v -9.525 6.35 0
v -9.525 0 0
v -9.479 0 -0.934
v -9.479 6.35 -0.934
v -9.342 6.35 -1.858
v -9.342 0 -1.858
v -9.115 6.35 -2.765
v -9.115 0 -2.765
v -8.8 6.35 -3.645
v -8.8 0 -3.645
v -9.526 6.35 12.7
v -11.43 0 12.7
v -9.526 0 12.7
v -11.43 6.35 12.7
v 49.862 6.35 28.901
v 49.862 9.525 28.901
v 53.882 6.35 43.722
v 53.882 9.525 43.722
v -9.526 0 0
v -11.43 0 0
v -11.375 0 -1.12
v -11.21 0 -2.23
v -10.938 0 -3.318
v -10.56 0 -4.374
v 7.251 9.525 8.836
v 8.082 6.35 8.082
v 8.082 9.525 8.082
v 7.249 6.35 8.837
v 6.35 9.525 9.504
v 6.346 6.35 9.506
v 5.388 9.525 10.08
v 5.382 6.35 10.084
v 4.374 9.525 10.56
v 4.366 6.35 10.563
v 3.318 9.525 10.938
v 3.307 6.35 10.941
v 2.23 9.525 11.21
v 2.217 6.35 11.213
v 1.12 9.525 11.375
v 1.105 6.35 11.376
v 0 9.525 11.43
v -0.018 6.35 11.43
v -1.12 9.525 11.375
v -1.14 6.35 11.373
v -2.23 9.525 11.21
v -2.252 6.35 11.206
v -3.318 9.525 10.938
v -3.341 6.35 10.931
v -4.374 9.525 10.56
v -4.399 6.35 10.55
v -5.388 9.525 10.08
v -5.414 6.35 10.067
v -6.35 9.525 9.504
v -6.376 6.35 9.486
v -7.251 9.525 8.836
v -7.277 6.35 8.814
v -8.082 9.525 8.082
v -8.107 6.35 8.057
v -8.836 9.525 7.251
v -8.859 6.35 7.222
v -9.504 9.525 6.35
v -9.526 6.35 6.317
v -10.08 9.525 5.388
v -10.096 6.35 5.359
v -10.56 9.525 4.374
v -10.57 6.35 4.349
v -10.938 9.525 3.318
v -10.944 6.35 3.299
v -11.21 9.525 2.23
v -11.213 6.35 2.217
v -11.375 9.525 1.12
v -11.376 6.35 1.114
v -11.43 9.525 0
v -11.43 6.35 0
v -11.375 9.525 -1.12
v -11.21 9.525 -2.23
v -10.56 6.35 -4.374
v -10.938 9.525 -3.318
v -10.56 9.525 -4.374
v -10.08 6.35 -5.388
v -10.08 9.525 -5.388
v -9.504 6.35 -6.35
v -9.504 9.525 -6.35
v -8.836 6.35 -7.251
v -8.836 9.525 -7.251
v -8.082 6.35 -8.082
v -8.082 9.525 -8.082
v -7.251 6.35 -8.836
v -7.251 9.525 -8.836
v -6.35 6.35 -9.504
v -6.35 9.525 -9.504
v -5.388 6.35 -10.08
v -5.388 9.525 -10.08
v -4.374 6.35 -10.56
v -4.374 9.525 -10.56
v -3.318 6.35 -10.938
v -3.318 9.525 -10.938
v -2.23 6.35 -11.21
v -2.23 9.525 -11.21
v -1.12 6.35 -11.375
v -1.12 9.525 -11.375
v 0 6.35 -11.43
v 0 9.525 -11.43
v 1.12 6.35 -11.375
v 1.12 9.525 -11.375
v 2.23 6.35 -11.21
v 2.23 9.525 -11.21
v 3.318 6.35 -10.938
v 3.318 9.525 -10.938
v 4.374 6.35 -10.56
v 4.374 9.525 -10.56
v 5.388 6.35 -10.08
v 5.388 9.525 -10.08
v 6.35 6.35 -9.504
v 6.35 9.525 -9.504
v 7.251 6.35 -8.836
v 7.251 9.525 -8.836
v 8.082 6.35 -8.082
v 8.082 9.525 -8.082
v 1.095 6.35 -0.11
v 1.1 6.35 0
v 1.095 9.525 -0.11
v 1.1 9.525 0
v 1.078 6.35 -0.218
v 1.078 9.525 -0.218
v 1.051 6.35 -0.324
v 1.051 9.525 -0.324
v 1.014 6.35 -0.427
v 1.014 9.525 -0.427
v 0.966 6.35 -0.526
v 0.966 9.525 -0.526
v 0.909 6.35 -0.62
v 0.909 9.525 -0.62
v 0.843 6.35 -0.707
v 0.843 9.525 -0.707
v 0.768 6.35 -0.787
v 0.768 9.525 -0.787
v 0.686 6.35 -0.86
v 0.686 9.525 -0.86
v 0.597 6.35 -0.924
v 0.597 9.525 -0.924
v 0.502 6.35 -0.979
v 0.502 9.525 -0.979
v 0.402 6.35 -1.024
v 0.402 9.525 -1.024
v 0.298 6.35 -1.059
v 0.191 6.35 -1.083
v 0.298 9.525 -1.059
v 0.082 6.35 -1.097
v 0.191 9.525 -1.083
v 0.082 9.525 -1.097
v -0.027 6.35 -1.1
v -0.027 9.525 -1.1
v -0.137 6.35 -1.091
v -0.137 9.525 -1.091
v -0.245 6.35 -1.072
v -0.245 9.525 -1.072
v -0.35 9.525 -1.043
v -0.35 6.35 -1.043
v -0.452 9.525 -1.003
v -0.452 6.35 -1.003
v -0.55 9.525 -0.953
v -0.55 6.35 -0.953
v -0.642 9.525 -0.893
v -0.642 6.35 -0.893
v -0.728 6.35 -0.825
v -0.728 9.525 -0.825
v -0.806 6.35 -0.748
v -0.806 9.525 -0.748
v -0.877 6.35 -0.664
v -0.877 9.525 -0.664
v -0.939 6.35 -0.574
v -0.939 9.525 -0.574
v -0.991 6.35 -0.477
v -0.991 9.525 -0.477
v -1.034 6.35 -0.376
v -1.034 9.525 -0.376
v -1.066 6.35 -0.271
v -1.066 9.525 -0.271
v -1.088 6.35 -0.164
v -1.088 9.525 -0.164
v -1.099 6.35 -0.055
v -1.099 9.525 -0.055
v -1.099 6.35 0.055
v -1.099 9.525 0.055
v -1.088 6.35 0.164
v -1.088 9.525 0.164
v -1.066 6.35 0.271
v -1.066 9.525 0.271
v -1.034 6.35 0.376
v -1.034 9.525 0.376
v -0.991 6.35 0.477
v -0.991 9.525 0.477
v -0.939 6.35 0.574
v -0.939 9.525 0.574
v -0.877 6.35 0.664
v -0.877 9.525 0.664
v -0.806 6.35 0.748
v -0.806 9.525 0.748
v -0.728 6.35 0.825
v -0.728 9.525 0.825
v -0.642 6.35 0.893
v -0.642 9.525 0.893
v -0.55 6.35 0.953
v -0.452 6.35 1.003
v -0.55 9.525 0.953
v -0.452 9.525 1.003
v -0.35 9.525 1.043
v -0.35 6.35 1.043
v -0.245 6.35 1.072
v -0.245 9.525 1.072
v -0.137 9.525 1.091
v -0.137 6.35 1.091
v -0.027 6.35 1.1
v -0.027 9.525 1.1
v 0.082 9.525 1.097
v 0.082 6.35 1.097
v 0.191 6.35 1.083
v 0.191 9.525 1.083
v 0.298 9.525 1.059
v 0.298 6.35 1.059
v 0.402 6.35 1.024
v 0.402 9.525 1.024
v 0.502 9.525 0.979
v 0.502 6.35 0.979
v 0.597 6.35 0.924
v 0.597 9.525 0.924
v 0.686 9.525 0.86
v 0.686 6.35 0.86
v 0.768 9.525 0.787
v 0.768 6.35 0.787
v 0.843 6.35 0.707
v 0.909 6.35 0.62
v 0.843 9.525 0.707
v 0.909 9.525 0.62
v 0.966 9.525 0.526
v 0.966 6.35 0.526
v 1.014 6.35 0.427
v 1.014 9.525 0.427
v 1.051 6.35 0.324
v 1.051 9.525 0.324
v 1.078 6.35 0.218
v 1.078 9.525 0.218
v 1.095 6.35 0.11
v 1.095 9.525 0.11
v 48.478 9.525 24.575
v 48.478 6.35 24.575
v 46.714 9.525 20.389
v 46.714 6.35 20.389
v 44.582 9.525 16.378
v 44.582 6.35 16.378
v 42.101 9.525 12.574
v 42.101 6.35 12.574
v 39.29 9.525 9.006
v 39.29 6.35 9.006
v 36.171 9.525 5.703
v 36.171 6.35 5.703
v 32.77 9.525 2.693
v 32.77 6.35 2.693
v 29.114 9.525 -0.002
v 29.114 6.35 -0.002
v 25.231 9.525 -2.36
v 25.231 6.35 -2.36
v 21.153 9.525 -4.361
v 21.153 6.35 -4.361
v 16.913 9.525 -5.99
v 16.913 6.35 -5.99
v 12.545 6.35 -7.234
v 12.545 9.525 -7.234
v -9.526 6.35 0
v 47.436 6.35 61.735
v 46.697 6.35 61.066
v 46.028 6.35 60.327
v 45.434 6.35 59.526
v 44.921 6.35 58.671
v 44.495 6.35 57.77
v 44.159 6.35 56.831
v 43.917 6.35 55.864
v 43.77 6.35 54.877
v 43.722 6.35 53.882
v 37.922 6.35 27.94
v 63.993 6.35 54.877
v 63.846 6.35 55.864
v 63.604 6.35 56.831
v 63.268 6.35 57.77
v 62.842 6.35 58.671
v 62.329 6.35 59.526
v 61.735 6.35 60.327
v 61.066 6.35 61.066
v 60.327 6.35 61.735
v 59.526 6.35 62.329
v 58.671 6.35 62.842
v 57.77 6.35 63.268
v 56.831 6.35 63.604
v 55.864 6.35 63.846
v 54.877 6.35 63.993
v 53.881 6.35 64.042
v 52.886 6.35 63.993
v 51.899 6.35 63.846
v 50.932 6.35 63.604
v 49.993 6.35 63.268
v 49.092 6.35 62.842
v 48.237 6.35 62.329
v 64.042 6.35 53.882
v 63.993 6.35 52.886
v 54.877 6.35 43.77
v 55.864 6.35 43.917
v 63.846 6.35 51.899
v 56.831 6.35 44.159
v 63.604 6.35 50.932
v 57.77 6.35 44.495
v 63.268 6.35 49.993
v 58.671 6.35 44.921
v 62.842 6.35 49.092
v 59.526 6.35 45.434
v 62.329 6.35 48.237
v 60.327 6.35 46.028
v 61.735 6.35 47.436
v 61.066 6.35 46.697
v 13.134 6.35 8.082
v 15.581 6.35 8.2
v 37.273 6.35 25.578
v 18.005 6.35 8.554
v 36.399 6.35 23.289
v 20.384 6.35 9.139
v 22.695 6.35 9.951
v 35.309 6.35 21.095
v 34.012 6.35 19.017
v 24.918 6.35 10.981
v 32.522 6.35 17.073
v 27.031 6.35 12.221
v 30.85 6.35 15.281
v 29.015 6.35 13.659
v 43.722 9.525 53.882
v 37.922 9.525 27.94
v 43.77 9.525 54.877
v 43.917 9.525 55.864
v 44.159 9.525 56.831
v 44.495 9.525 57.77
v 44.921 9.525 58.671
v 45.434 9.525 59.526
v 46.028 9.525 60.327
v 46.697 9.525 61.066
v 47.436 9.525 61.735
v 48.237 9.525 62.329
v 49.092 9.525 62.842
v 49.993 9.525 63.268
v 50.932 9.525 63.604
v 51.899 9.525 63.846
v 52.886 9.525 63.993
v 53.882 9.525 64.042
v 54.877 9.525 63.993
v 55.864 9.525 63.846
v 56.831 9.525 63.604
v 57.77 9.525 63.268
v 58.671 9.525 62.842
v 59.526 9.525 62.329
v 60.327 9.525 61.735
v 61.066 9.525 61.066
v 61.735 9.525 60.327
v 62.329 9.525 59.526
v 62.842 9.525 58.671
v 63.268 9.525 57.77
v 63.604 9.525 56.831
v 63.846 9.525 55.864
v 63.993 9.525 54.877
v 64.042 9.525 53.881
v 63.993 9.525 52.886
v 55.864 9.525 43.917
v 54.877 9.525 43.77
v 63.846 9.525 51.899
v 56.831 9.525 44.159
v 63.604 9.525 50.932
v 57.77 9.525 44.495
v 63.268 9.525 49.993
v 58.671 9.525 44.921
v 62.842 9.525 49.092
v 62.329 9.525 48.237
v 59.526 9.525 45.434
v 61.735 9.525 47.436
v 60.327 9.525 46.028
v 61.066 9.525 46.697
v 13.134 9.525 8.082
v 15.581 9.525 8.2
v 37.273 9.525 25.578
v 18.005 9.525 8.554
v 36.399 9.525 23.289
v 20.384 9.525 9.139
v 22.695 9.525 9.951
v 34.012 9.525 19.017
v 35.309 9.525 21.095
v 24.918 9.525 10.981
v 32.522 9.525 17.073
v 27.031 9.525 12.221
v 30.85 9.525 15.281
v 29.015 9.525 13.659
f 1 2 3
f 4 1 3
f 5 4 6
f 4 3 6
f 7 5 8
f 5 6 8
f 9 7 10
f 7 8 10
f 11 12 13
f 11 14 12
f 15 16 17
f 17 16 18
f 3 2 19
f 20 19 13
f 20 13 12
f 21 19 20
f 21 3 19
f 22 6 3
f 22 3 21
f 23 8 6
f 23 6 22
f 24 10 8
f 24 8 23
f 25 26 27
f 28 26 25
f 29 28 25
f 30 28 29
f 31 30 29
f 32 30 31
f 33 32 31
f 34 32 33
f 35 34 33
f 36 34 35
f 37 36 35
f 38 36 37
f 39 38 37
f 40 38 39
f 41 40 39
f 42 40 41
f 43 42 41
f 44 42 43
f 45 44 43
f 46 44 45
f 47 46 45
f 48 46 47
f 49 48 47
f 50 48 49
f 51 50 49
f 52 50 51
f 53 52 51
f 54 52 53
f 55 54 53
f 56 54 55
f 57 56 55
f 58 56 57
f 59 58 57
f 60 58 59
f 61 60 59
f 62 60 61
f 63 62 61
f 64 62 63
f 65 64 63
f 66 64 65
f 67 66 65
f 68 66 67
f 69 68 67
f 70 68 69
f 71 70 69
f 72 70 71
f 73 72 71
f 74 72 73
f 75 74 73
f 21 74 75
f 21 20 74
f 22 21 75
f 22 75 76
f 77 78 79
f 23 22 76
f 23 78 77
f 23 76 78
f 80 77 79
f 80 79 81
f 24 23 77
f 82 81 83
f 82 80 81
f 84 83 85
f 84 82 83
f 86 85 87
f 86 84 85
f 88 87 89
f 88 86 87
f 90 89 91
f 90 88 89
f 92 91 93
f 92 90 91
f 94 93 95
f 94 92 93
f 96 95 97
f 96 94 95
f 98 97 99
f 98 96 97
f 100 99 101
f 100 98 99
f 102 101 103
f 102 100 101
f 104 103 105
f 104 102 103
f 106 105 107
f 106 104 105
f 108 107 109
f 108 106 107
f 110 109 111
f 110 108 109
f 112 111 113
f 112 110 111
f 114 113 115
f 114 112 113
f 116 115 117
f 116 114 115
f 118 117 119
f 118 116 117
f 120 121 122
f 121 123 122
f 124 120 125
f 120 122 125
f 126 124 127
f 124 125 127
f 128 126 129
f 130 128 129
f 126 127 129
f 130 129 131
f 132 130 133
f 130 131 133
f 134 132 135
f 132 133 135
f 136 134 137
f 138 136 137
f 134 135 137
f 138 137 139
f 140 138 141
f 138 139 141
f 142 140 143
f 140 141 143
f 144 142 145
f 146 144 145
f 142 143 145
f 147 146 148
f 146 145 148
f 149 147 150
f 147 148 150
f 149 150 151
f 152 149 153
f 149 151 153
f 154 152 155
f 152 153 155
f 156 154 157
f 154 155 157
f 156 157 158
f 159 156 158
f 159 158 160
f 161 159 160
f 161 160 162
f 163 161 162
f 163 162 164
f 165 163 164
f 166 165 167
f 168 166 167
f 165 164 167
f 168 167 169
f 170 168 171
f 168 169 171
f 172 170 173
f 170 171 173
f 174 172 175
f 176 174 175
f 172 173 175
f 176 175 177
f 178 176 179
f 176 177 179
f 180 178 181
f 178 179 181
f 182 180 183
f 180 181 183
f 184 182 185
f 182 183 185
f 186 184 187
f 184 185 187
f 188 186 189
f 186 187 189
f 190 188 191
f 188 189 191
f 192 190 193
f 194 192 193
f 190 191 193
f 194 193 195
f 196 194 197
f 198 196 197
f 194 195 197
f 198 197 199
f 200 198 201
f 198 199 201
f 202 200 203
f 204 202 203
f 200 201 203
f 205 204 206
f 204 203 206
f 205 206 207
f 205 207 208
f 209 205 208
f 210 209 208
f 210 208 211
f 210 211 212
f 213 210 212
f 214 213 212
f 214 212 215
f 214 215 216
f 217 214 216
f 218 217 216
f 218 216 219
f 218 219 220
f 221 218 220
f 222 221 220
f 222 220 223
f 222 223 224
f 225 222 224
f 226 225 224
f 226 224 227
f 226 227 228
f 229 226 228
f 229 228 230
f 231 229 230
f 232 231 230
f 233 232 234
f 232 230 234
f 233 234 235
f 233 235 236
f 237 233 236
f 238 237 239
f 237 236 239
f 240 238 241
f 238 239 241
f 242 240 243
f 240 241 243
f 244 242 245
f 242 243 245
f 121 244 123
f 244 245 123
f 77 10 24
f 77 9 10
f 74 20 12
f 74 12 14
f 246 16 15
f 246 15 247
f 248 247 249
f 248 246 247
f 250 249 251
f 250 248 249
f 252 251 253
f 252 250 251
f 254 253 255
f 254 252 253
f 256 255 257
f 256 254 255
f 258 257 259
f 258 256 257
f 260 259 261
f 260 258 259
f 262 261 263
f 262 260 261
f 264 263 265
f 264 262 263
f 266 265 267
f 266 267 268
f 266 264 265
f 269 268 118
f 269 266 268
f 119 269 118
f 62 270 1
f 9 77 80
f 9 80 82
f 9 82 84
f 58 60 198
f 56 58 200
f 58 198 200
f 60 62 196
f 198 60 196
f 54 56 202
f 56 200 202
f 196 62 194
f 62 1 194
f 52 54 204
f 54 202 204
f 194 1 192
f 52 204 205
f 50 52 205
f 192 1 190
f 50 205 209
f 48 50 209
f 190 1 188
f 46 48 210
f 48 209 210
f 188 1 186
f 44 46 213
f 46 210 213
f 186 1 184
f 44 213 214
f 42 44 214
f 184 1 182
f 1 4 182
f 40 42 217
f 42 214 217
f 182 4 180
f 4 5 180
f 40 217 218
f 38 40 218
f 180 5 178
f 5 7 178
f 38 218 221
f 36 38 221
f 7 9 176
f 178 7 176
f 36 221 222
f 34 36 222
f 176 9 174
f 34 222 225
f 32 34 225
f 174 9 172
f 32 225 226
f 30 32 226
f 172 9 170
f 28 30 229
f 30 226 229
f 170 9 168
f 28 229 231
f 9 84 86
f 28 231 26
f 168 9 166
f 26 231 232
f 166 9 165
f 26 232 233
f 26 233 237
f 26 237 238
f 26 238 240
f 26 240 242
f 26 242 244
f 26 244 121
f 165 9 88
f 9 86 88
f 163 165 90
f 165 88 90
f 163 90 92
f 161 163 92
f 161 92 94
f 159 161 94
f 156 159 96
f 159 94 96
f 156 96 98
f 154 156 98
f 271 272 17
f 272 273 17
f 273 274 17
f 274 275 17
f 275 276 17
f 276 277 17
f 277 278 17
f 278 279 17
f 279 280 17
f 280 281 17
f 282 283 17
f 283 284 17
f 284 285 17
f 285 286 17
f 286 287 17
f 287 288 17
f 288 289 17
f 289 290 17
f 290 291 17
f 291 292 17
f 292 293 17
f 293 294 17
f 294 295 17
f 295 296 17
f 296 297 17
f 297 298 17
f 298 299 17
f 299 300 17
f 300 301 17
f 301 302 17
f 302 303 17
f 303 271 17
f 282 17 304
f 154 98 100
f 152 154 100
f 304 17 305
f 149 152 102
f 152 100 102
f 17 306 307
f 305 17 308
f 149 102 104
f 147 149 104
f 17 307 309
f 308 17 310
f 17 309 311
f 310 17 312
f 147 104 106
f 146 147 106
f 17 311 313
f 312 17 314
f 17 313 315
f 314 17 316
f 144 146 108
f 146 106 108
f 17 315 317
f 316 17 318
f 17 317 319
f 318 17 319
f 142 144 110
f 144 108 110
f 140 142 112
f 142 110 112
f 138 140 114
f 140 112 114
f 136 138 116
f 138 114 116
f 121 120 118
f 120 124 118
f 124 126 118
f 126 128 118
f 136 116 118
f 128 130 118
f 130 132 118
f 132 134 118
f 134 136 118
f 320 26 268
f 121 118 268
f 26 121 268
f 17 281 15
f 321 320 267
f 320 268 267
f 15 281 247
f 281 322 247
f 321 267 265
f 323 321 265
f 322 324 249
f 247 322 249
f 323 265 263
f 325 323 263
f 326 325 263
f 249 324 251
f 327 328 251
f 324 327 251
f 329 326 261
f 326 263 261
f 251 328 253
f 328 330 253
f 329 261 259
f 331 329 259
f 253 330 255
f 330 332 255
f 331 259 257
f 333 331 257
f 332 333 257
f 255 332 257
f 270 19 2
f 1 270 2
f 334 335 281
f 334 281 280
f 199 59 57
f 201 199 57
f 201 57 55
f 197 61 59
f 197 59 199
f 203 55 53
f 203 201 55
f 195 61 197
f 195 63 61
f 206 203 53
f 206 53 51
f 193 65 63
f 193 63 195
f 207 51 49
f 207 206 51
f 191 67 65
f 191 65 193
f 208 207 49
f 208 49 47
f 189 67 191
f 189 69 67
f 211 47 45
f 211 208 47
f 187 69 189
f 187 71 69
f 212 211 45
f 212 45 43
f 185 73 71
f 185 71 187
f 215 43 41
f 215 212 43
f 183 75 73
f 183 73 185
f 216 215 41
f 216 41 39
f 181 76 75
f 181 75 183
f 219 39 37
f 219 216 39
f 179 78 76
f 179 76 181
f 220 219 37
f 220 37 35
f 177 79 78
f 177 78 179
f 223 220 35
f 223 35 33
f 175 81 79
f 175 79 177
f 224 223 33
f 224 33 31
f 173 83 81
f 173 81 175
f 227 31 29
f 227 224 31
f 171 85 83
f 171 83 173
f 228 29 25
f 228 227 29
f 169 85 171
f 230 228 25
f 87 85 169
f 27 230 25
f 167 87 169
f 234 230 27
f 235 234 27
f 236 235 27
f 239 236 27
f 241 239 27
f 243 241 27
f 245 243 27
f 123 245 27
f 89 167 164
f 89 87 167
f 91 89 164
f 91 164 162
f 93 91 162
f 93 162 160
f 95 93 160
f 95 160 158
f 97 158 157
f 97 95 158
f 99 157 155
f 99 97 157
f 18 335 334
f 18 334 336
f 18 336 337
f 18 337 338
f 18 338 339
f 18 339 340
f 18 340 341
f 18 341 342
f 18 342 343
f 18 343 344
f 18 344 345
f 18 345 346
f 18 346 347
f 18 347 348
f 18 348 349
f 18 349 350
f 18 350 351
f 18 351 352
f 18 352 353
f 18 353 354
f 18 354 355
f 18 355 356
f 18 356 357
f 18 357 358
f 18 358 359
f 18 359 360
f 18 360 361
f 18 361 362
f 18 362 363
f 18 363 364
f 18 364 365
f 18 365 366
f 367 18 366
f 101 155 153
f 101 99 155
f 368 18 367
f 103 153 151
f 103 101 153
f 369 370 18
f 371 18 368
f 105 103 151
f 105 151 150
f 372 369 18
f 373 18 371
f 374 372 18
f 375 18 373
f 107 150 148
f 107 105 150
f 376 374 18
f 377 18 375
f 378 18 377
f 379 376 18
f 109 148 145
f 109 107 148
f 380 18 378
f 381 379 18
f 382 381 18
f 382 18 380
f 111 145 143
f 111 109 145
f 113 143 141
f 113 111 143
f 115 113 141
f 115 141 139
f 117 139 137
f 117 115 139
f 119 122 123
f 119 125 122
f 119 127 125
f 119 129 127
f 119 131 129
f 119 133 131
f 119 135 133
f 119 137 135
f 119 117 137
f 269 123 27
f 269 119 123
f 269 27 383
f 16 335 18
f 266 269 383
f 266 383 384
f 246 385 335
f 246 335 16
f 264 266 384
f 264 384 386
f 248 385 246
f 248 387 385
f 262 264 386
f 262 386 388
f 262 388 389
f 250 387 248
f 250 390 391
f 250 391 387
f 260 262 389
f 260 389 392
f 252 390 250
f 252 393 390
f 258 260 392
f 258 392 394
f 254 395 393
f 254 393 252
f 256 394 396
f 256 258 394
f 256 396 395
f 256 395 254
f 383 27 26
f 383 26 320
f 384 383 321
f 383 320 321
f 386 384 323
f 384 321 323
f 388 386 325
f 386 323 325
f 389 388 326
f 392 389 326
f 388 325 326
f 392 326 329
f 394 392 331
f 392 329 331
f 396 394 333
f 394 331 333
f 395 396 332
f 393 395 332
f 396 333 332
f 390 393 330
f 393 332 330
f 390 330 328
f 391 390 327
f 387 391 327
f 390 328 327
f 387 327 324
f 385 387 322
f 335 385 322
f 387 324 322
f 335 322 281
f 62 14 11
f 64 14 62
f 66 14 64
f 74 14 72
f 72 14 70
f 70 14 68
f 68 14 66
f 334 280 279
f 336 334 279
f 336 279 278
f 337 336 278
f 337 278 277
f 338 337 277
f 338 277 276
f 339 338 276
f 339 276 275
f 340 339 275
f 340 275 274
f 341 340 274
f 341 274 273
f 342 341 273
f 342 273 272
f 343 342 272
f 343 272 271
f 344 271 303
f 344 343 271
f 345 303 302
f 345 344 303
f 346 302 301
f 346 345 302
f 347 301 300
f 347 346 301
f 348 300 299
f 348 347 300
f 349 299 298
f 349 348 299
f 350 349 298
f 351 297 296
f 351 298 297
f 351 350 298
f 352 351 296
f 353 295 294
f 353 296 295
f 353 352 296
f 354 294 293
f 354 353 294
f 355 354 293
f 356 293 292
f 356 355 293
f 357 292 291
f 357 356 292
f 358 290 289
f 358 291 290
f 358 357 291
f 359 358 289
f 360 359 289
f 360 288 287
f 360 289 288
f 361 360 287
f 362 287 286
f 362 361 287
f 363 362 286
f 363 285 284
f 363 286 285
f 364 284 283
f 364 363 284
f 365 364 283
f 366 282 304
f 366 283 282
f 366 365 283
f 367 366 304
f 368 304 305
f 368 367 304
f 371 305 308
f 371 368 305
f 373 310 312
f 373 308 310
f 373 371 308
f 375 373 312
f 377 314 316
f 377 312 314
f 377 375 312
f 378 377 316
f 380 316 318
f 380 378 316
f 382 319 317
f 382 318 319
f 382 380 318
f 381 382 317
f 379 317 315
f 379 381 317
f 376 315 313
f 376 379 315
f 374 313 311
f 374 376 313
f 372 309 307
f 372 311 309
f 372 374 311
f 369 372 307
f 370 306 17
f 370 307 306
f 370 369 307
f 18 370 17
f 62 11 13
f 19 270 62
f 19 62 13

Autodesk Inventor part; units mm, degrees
ref_plane "YZ Plane" through (0, 0, 0) normal (1, 0, 0) x (0, 1, 0)
ref_plane "XZ Plane" through (0, 0, 0) normal (0, 1, 0) x (-1, 0, 0)
ref_plane "XY Plane" through (0, 0, 0) normal (0, 0, 1) x (1, 0, 0)
sketch "Sketch1" plane through (0, 0, 0) normal (0, 1, 0) x (-1, 0, 0)
  circle A0 centre (0, 0) radius 11.43
  circle A1 centre (0, 0) radius 9.525
  dimension "d0" = 22.86
  dimension "d1" = 19.05
extrude "Extrusion1" add sketch "Sketch1" along normal blind 6.35
sketch "Sketch2" plane through (0, 6.35, 0) normal (0, 1, 0) x (1, 0, 0)
  circle A0 centre (0, 0) radius 11.43
extrude "Extrusion2" add sketch "Sketch2" along normal blind 3.175
sketch "Sketch3" plane through (0, 9.525, 0) normal (0, 1, 0) x (1, 0, 0)
  circle A0 centre (0, 0) radius 1.1
  dimension "d6" = 2.2
extrude "Extrusion3" cut sketch "Sketch3" against normal blind 7.9375
sketch "Sketch6" plane through (0, 0, 0) normal (0, -1, 0) x (1, 0, 0)
  line L0 (-16.0948, 0) -> (0, 0)
  line L1 (0, 0) -> (0, -15.3841)
  line L2 (0, -15.3841) -> (-16.0948, -15.3841)
  line L3 (-16.0948, -15.3841) -> (-16.0948, 0)
  line L4 (-16.0948, 14.6504) -> (12.3807, 14.6504)
  line L5 (12.3807, 14.6504) -> (12.3807, -15.3841)
  line L6 (12.3807, -15.3841) -> (-16.0948, -15.3841)
  line L7 (-16.0948, -15.3841) -> (-16.0948, 14.6504)
extrude "Extrusion6" cut sketch "Sketch6" against normal blind 6.35 contours L7 L4 L5 L6 L1 L0
sketch "Sketch7" plane through (0, 0, -9.525) normal (1, 0, 0) x (0, 0, -1)
  line L0 (1.905, 6.35) -> (-20.955, 6.35) projected
  line L1 (1.905, 6.35) -> (0, 6.35)
  line L2 (0, 6.35) -> (0, 0)
  line L3 (0, 0) -> (1.905, 0)
  line L4 (1.905, 0) -> (1.905, 6.35)
  point P0 (-9.525, 0)
  point P1 (-9.525, 6.35)
extrude "Extrusion7" add sketch "Sketch7" along normal blind 11.43
sketch "Sketch16" plane through (0, 0, 0) normal (0, -1, 0) x (1, 0, 0)
  point P0 (0, 0)
sketch "Sketch17" plane through (-11.43, 0, 0) normal (0, 0, 1) x (1, 0, 0)
  line L0 (0, 0) -> (0, 6.35) projected
  line L1 (0, 6.35) -> (1.9041, 6.35)
  line L2 (1.9041, 6.35) -> (1.9041, 0)
  line L3 (1.9041, 0) -> (0, 0)
  line L4 (0, 0) -> (0, 6.35)
  point P0 (11.43, 0)
extrude "Extrusion16" add sketch "Sketch17" along normal blind 12.7
sketch "Sketch18" plane through (0, 6.35, 0) normal (0, -1, 0) x (1, 0, 0)
  circle A0 centre (0, 0) radius 1.1 projected
  line L0 (0, 0) -> (-18.4871, -7.6576)
  line L1 (0, 0) -> (20.0102, 0) construction
  line L2 (-18.4871, -7.6576) -> (1.1, -41.4972)
  line L3 (1.1, -41.4972) -> (21.3747, 0)
  line L4 (21.3747, 0) -> (0, 0)
  dimension "d61" = 157.5
extrude "Extrusion17" cut sketch "Sketch18" along normal blind 25.4 contours L4 L3 L2 L0 A0 | A0 L0 L4 picked at (-0.5236, -0.5052)
sketch "Sketch21" plane through (0, 9.525, 0) normal (0, 1, 0) x (1, 0, 0)
  line L0 (0, 0) -> (76.2, 0) construction
  circle A0 centre (0, 0) radius 11.43 projected
  line L1 (8.0168, -8.1472) -> (33.4168, -8.1472)
  line L2 (8.0168, -8.1472) -> (33.4168, -8.1472) construction
  circle A1 centre (53.8815, -53.8815) radius 10.16
  line L3 (33.4168, -8.1472) -> (46.6973, -46.6973)
  line L4 (8.0822, 8.0822) -> (38.5622, 8.0822)
  line L5 (53.8815, -53.8815) -> (61.0657, -46.6973)
  line L6 (53.8815, -53.8815) -> (64.0415, -53.8815) construction
  line L7 (61.0657, -46.6973) -> (38.5622, 8.0822)
  line L8 (0, 0) -> (8.0168, -8.1472)
  line L9 (46.6973, -46.6973) -> (53.8815, -53.8815)
  line L10 (8.0168, 8.1472) -> (8.0168, -8.1472)
  dimension "d85" = 25.4
  dimension "d86" = 0
  dimension "d87" = 20.32
  dimension "d88" = 30.48
  dimension "d89" = 45
extrude "Extrusion20" add sketch "Sketch21" against normal blind 3.175 contours L5 L9 A1 | A1 L9 L5
sketch "Sketch22" plane through (0, 9.525, 0) normal (0, 1, 0) x (1, 0, 0)
  circle A0 centre (0, 0) radius 1.1 projected
  line L0 (0, 0) -> (8.0822, 8.0822)
  circle A1 centre (0, 0) radius 11.43 projected
  line L1 (0, 0) -> (11.43, 0) construction
  line L2 (8.0822, 8.0822) -> (39.8322, 8.0822)
  line L3 (39.8322, 8.0822) -> (53.8815, -43.7215)
  circle A2 centre (53.8815, -53.8815) radius 10.16 projected
  line L4 (0, 0) -> (8.0822, -8.0822)
  line L5 (8.0822, -8.0822) -> (33.4822, -8.0822)
  line L6 (33.4822, -8.0822) -> (43.7215, -53.8815)
  line L7 (53.8815, -43.7215) -> (43.7215, -53.8815)
  dimension "d92" = 45
  dimension "d93" = 31.75
  dimension "d94" = 25.4
extrude "Extrusion21" add sketch "Sketch22" against normal blind 3.175 contours L2 L3 A2 L6 L5 A1
fillet "Fillet6" radius 25.4 1 edges at (33.4822, 7.9375, 8.0822)
fillet "Fillet7" radius 50.8 1 edges at (39.8322, 7.9375, -8.0822)
